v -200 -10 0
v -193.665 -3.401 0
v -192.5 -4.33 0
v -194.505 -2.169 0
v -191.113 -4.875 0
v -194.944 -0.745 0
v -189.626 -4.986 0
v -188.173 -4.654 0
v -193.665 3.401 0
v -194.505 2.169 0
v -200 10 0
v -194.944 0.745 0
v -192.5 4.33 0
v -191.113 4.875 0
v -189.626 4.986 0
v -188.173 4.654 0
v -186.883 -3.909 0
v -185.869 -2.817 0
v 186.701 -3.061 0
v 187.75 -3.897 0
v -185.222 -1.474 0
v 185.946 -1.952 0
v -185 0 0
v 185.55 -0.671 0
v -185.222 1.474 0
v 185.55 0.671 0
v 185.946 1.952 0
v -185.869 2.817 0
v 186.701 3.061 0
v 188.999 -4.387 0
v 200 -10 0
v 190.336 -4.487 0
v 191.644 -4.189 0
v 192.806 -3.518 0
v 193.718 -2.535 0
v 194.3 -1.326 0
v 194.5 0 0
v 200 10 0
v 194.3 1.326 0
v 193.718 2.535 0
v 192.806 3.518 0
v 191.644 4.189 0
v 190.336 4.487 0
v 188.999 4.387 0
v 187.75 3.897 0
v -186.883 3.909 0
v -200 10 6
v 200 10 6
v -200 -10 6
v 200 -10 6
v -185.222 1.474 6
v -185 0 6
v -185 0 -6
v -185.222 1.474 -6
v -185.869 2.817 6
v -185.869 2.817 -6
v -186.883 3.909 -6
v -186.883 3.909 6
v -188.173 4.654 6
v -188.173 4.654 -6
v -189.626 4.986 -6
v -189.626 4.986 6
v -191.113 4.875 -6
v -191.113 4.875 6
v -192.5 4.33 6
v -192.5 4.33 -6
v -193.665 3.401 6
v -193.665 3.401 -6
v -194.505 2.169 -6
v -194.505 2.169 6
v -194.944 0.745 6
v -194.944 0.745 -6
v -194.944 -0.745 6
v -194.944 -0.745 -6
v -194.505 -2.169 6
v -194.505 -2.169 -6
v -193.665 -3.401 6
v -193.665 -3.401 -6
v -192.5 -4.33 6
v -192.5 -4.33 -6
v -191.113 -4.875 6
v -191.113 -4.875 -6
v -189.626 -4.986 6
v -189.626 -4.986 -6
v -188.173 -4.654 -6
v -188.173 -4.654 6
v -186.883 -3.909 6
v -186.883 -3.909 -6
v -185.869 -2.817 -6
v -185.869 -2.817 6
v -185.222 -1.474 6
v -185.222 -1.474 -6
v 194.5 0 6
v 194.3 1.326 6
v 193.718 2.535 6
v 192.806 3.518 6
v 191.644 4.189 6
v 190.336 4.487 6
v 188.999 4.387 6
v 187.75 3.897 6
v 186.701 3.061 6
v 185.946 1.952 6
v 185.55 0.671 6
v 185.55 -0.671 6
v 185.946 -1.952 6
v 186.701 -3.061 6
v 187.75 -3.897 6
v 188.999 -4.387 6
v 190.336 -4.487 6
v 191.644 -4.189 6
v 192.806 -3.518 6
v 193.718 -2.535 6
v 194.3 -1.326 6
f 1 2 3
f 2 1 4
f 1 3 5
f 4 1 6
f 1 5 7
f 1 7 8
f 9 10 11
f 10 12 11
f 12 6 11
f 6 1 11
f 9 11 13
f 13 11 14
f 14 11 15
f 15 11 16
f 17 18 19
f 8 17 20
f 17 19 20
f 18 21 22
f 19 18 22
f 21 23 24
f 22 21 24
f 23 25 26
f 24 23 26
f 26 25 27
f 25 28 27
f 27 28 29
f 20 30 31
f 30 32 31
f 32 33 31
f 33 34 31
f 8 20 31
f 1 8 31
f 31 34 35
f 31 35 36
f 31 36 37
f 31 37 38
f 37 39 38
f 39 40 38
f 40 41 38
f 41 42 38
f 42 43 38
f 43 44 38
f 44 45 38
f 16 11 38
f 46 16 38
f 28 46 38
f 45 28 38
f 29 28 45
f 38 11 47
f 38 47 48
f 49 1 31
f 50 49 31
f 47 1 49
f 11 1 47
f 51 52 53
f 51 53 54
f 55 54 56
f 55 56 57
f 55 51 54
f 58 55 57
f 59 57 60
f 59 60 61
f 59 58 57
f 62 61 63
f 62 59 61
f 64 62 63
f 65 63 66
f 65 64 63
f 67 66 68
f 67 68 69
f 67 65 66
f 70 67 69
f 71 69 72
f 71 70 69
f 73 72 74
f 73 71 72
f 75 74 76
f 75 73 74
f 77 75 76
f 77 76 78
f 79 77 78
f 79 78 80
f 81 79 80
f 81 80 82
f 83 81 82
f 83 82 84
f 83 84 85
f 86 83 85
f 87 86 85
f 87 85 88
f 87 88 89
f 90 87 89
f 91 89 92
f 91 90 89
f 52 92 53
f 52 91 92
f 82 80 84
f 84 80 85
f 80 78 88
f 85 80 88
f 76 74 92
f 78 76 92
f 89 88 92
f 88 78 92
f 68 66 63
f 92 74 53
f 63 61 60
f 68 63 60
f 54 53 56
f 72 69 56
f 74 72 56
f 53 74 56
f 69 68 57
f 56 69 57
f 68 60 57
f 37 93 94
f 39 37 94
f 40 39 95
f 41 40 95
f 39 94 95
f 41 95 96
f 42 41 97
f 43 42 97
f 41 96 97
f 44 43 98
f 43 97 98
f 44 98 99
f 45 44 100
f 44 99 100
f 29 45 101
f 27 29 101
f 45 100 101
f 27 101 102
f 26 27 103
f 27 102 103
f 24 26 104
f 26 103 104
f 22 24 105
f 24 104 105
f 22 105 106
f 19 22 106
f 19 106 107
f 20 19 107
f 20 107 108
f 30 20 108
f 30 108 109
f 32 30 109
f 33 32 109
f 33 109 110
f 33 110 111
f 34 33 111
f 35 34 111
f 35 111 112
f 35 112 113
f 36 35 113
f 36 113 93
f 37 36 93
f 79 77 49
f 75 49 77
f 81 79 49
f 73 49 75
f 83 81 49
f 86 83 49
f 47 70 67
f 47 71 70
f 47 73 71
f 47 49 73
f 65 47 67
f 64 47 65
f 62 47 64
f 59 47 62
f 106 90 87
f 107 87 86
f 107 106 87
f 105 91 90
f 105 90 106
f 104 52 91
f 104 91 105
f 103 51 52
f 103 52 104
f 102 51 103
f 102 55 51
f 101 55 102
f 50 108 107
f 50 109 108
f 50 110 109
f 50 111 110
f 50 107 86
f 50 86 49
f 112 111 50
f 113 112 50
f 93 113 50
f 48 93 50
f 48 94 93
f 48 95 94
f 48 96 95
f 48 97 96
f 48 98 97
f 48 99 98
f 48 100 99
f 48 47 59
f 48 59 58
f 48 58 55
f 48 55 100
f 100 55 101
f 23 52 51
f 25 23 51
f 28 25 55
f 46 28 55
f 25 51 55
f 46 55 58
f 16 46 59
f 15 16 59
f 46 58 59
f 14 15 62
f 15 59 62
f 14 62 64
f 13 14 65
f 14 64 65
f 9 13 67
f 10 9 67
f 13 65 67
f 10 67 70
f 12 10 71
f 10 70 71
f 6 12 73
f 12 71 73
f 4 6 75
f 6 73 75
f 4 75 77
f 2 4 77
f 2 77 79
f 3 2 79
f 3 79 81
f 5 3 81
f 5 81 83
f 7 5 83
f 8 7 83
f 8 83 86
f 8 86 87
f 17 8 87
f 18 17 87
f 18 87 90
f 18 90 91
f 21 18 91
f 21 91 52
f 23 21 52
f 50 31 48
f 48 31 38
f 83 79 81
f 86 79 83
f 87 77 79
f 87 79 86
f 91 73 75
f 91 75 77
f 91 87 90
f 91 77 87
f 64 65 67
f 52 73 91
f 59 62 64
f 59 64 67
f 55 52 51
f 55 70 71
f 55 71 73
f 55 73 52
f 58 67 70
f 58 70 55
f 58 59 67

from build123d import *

# Parameters (mm, degrees)
ESQUISSE1_W             = 400
ESQUISSE1_H             = 20
BOSS_EXTRU_1_DEPTH      = 6
ESQUISSE2_R             = 4.5
ESQUISSE2_R_2           = 5
ENL_V_MAT_EXTRU_1_DEPTH = 201.33971149
ESQUISSE3_R             = 5
BOSS_EXTRU_2_DEPTH      = 12


with BuildPart() as part:
    # Esquisse1 → Boss.-Extru.1 (new body)
    with BuildSketch(Plane.XY):
        Rectangle(ESQUISSE1_W, ESQUISSE1_H)
    extrude(amount=BOSS_EXTRU_1_DEPTH)

    # Esquisse2 → Enlèv. mat.-Extru.1 (cut, through all)
    with BuildSketch(Plane.XY.offset(6)):
        with Locations((190, 0)):
            Circle(ESQUISSE2_R)
        with Locations((-190, 0)):
            Circle(ESQUISSE2_R_2)
    extrude(amount=-ENL_V_MAT_EXTRU_1_DEPTH, mode=Mode.SUBTRACT)


with BuildPart() as body_2:
    # Esquisse3 → Boss.-Extru.2 (new body)
    with BuildSketch(Plane.XY.offset(6)):
        with Locations((-190, 0)):
            Circle(ESQUISSE3_R)
    extrude(amount=-BOSS_EXTRU_2_DEPTH)


solid = Compound([part.part, body_2.part])
